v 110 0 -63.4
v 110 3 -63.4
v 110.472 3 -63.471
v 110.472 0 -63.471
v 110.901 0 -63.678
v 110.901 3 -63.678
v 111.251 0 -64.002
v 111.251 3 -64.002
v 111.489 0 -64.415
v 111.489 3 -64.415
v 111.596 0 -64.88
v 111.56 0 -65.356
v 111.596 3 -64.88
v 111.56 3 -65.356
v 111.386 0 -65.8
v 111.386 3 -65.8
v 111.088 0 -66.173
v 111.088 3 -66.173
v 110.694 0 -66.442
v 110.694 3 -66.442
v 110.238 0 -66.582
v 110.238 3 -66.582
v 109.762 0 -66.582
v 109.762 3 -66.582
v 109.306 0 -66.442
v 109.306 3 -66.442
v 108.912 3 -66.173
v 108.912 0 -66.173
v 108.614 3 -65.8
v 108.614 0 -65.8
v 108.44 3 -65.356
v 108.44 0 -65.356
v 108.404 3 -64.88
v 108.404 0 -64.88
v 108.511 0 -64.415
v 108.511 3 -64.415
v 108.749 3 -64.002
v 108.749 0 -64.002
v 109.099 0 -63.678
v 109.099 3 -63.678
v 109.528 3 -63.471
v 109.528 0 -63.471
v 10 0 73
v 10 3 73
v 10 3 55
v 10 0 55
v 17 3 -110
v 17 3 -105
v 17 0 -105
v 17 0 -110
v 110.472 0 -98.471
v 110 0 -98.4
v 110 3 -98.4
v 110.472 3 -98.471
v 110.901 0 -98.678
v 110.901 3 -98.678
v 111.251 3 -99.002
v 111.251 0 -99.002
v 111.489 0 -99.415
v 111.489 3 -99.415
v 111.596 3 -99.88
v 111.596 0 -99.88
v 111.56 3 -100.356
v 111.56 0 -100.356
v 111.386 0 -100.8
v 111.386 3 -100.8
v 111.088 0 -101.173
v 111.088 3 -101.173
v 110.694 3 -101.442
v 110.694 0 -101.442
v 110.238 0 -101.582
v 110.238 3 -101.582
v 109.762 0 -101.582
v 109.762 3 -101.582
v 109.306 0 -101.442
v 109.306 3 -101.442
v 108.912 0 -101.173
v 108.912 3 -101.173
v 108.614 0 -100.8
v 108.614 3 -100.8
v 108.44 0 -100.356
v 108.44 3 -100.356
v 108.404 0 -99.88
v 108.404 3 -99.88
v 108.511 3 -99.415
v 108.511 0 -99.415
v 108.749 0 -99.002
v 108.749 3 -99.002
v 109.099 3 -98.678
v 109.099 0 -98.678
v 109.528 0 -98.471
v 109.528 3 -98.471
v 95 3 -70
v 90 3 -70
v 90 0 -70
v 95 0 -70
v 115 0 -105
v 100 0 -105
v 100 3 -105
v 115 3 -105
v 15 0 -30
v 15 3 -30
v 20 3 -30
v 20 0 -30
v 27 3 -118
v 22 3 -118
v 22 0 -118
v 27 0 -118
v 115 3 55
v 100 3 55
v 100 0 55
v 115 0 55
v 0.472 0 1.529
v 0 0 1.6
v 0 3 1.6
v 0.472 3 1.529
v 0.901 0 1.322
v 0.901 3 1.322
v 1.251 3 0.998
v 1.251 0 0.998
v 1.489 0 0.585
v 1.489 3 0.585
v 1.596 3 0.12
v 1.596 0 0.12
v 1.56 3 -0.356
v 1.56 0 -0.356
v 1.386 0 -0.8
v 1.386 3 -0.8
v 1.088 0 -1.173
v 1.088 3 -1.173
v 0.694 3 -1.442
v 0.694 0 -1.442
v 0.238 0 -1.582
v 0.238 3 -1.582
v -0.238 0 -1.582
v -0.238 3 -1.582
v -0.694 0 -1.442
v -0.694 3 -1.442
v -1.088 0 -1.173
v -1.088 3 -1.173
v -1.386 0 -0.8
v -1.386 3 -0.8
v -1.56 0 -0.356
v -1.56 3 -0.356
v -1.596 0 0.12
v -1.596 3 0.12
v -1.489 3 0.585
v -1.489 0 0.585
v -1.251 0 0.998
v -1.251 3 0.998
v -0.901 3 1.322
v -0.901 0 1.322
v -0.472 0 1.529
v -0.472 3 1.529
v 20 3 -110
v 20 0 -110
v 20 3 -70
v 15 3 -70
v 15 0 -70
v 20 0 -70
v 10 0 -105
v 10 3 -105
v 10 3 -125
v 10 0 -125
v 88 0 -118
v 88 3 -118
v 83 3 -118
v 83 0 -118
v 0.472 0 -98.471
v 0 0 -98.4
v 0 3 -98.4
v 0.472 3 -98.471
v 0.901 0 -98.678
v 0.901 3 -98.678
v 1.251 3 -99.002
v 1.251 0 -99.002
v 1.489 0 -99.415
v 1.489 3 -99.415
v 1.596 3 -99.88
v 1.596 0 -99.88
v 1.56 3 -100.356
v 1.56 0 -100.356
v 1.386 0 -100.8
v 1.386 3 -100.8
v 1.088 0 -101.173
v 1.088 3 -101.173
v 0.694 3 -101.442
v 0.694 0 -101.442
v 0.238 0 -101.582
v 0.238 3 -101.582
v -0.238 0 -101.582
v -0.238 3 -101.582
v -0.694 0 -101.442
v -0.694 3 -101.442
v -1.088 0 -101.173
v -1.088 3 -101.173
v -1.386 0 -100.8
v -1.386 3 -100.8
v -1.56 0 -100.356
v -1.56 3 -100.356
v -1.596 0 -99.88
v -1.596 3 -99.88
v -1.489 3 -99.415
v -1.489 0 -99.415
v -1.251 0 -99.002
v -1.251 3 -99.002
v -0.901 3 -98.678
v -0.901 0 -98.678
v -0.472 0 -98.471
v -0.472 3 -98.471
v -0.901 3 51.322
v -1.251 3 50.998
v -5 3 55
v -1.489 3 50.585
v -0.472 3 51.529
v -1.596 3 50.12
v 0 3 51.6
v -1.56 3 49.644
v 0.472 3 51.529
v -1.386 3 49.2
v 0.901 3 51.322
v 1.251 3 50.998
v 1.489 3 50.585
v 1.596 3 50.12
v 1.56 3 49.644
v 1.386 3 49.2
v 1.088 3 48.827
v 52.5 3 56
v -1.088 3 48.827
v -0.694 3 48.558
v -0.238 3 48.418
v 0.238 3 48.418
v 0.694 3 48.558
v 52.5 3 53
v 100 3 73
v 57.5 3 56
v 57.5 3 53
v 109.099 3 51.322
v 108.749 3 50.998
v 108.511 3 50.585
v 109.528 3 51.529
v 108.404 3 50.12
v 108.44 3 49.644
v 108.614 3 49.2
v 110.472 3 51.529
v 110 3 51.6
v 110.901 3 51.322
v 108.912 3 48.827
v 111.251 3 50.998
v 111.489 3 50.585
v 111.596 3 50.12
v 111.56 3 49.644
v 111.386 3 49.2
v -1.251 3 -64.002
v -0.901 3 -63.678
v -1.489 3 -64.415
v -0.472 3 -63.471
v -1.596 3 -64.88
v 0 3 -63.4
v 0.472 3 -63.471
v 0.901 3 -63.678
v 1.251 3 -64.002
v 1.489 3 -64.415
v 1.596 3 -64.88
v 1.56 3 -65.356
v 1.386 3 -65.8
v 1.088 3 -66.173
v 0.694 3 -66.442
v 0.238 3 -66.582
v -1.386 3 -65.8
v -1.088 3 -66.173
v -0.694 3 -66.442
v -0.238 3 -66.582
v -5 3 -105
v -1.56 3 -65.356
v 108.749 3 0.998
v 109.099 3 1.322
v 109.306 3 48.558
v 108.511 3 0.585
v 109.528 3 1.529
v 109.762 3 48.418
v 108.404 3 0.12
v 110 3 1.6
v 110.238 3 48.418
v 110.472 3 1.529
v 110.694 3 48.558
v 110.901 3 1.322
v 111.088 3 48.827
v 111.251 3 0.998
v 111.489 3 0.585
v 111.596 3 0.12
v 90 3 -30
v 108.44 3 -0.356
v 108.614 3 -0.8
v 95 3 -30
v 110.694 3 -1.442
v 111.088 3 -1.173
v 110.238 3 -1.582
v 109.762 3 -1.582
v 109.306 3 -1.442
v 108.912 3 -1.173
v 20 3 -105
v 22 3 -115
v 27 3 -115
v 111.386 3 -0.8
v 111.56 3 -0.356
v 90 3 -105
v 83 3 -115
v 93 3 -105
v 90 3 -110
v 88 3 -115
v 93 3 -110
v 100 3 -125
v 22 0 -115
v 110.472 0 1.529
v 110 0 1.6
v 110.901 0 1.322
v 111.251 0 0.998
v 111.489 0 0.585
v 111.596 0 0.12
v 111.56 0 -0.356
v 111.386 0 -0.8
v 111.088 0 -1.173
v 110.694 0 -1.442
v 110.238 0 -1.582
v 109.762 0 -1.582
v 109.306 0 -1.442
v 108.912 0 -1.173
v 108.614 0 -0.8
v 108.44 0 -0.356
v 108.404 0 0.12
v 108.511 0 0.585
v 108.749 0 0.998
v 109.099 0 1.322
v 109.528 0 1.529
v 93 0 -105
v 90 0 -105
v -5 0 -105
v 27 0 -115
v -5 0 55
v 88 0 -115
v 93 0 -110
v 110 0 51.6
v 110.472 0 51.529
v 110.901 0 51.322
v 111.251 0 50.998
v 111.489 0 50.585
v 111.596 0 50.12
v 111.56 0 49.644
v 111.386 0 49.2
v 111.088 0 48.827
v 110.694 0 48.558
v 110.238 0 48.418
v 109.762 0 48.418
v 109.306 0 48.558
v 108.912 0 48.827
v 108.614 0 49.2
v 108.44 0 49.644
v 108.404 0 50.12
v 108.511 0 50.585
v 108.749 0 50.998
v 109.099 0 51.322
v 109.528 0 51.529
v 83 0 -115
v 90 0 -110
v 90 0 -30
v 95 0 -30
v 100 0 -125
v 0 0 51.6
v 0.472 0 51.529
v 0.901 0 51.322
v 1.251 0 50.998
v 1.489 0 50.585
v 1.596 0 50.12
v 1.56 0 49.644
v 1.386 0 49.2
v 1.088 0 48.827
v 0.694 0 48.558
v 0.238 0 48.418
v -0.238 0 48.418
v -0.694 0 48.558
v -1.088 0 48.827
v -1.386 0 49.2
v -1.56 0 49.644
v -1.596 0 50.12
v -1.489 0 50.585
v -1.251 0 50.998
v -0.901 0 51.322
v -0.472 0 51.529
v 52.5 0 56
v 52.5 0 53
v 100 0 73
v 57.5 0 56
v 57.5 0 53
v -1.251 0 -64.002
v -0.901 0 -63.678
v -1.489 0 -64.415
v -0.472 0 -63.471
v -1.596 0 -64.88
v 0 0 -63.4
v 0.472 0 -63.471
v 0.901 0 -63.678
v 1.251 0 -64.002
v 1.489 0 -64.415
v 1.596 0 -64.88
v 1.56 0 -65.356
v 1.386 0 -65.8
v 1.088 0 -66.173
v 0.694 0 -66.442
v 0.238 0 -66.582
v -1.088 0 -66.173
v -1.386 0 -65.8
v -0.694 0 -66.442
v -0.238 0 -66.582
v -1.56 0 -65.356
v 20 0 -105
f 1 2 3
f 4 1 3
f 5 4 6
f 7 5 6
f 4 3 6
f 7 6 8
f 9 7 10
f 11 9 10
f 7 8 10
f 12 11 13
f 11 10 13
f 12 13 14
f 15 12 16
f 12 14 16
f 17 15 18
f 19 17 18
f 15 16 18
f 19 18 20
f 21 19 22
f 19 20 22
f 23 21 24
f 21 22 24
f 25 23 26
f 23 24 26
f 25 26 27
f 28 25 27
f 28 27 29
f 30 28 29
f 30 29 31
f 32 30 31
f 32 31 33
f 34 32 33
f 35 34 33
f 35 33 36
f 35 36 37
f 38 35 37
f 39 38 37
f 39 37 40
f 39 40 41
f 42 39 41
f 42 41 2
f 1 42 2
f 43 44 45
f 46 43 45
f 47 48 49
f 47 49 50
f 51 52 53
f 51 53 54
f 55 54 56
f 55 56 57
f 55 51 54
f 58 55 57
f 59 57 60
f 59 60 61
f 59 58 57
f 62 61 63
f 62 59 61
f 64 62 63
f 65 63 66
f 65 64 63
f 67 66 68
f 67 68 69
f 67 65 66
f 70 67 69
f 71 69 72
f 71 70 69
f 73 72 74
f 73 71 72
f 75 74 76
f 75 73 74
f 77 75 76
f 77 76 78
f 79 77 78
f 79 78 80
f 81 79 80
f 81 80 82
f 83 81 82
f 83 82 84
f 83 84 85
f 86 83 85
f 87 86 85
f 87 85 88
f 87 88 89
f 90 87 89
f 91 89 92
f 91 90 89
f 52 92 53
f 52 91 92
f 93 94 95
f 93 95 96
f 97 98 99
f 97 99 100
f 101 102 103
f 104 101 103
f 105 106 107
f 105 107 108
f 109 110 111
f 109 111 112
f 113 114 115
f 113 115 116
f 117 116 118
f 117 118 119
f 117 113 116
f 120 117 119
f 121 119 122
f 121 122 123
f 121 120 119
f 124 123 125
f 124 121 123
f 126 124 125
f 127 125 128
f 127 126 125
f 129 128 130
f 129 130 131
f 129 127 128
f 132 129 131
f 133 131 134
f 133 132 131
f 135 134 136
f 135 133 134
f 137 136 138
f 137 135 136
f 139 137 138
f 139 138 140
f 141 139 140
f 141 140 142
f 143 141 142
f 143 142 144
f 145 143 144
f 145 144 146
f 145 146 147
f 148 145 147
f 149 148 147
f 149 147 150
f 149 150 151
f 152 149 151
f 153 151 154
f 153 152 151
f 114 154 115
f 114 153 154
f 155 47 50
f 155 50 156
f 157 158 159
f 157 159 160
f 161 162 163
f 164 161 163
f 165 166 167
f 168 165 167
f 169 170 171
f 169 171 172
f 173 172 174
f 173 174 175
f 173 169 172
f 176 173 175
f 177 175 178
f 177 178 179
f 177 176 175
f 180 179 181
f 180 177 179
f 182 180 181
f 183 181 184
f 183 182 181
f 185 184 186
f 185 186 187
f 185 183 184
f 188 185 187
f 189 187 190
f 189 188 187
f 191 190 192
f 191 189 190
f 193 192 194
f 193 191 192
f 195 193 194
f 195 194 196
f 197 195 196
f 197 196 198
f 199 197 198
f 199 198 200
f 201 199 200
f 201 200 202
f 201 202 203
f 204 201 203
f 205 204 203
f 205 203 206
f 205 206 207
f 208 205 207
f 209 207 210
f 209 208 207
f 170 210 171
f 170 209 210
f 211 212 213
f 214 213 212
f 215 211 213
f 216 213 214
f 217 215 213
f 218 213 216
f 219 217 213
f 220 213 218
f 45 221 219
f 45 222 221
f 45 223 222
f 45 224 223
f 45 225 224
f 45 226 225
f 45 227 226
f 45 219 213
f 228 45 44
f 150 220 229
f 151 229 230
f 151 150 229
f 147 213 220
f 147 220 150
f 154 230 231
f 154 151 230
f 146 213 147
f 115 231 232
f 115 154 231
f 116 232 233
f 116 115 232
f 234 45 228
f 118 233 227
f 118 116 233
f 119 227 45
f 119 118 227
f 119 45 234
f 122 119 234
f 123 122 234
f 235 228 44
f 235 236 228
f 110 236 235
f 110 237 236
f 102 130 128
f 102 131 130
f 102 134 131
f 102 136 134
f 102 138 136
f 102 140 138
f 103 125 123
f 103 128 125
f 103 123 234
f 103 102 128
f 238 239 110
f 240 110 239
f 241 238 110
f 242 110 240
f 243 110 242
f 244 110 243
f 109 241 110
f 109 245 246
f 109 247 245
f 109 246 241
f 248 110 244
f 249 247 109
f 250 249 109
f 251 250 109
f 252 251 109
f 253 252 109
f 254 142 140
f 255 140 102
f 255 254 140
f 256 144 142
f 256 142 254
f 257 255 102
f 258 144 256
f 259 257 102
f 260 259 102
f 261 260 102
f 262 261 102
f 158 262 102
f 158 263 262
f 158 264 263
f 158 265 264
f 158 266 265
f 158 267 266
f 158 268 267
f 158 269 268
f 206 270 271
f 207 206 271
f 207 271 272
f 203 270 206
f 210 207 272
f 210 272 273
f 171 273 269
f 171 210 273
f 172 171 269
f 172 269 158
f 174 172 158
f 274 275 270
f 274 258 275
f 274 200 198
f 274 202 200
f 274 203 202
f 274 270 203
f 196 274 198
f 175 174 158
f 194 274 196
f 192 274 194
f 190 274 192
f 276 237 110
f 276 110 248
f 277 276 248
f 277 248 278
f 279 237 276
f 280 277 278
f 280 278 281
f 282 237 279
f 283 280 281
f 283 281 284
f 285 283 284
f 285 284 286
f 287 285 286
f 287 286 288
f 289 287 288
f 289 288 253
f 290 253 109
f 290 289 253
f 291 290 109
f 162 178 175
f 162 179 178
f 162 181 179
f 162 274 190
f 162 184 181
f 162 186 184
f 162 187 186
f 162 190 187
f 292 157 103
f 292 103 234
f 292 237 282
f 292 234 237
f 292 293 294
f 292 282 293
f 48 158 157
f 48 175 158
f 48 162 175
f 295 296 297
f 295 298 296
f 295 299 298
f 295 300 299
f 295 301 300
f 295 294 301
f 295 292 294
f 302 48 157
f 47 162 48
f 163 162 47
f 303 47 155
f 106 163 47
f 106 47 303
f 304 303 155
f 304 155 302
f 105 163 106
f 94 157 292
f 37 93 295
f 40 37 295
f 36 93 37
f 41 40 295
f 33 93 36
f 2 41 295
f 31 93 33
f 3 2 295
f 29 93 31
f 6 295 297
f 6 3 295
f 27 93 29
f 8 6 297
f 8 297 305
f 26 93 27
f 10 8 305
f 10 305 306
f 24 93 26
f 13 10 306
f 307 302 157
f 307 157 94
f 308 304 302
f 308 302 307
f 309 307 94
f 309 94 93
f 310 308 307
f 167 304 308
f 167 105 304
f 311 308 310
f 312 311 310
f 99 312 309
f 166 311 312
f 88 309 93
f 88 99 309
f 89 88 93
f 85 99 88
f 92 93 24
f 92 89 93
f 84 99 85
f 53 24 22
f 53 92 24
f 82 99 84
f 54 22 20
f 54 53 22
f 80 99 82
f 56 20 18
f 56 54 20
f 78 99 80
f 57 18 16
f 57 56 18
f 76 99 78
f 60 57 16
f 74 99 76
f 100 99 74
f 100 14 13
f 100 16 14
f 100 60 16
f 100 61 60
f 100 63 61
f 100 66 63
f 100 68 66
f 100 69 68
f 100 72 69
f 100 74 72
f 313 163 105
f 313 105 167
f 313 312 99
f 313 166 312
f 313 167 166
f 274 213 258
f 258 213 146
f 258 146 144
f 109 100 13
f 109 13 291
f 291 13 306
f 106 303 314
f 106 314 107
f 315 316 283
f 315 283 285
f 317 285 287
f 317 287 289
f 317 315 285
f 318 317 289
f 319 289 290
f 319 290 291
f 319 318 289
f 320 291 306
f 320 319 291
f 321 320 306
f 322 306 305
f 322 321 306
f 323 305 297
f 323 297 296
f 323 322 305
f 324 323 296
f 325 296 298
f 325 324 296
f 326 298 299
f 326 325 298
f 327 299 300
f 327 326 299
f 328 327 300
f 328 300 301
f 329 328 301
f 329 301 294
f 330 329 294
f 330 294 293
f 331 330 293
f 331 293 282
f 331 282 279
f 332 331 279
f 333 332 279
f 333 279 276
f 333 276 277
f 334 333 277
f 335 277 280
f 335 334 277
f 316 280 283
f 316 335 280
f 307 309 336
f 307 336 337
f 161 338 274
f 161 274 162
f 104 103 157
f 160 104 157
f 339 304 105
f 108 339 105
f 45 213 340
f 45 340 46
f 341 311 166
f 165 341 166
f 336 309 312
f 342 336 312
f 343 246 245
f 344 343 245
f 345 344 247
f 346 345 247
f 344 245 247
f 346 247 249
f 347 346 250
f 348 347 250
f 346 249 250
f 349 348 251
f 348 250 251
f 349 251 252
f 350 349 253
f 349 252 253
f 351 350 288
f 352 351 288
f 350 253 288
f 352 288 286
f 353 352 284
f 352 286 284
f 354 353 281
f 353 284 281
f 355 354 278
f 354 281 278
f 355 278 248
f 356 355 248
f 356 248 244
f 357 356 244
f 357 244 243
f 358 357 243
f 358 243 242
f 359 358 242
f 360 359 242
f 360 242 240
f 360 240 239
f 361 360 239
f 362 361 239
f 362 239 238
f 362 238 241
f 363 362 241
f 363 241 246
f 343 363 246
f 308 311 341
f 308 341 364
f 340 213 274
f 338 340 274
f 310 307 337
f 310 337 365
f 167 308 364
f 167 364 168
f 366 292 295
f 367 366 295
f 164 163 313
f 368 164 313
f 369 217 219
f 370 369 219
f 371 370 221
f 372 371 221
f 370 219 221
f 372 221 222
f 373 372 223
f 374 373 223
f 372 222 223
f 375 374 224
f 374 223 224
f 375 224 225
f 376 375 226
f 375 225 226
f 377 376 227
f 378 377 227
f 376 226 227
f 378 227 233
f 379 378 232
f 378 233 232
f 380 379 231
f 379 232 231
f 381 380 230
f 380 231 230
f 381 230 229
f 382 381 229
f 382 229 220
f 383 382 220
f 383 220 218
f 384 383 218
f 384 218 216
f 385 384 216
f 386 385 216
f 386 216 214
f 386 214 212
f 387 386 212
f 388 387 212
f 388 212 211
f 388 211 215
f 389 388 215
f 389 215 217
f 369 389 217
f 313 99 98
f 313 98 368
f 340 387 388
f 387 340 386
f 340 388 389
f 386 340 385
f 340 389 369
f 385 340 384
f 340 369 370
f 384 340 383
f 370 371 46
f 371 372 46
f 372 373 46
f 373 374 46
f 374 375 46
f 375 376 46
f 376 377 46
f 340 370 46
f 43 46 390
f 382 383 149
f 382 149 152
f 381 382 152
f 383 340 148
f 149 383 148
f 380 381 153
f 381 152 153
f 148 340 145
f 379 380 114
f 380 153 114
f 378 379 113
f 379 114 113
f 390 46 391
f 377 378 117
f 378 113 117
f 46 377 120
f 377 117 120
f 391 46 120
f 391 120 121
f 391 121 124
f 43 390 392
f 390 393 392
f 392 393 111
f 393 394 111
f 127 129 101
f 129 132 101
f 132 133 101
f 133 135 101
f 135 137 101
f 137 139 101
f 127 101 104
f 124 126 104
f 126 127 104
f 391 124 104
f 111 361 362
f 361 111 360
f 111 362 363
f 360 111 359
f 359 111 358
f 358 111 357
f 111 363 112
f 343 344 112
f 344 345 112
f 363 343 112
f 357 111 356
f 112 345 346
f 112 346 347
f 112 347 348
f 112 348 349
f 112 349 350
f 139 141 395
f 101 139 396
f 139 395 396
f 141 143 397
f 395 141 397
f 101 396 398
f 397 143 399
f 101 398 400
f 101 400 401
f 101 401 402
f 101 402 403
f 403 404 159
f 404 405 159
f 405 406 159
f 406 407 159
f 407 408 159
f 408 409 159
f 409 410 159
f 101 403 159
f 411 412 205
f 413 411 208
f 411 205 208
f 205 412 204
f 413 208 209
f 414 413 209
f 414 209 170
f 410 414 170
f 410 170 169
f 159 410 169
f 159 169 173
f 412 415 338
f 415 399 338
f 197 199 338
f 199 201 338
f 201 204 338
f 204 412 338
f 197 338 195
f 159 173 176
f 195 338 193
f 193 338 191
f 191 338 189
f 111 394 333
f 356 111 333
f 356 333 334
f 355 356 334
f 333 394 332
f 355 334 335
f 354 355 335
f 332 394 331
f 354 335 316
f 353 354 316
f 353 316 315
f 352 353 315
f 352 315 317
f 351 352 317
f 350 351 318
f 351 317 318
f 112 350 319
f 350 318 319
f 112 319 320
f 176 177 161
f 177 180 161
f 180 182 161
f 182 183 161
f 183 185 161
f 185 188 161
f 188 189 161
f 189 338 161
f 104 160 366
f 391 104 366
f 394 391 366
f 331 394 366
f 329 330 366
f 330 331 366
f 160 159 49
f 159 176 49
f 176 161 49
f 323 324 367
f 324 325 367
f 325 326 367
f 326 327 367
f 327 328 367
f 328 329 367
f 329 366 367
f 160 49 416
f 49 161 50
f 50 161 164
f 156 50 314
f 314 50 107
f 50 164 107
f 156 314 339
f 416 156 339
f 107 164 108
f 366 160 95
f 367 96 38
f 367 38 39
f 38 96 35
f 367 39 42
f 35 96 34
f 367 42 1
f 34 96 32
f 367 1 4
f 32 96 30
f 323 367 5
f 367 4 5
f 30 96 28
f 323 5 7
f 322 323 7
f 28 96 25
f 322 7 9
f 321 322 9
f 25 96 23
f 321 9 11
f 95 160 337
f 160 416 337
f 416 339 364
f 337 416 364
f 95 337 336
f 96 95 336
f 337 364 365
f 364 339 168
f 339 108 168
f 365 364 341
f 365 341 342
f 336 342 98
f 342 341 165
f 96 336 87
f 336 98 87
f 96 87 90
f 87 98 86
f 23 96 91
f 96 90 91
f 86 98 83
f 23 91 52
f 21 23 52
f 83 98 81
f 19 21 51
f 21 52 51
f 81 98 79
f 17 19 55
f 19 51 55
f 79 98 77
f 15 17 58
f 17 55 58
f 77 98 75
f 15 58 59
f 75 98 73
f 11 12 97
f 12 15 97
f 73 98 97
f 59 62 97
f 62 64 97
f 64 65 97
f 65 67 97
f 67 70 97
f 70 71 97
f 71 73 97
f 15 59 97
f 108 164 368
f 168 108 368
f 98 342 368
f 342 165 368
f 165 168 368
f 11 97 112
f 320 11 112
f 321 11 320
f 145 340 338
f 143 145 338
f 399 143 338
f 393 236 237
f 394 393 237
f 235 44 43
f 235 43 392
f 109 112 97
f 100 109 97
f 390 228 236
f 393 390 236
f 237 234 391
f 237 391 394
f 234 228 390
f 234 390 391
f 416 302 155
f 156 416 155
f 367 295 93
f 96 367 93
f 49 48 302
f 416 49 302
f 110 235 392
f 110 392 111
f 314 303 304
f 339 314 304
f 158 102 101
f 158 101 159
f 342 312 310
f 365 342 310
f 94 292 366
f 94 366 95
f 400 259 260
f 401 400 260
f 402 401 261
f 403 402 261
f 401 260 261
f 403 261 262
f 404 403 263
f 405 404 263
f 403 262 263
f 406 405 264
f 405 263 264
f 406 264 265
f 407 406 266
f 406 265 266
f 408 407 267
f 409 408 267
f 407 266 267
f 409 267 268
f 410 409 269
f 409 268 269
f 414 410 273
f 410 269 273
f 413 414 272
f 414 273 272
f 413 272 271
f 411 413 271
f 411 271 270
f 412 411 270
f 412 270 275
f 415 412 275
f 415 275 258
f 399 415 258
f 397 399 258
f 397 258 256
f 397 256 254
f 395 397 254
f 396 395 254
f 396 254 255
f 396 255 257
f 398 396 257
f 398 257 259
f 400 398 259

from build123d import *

# Parameters (mm, degrees)
SKETCH_2_W          = 120
SKETCH_2_H          = 110
SKETCH_2_R          = 1.6
EXTRUDE_1_DEPTH     = 3
SKETCH_4_W          = 90
SKETCH_4_H          = 198
EXTRUDE_2_DEPTH     = 3
SKETCH_7_W          = 5
SKETCH_7_H          = 3
SKETCH_7_W_2        = 3
SKETCH_7_H_2        = 5
CUT_EXTRUDE_1_DEPTH = 170.879368965
SKETCH_8_W          = 5
SKETCH_8_H          = 3
CUT_EXTRUDE_2_DEPTH = 170.879368965
SKETCH_9_W          = 5
SKETCH_9_H          = 40
CUT_EXTRUDE_3_DEPTH = 170.879368965
SKETCH_10_W         = 15
SKETCH_10_H         = 50
EXTRUDE_5_DEPTH     = 3
SKETCH_11_R         = 1.6
CUT_EXTRUDE_4_DEPTH = 170.879368965


with BuildPart() as part:
    # 草图2 → 凸台-拉伸1 (new body)
    with BuildSketch(Plane(origin=(0, 0, 0), x_dir=(1, 0, 0), z_dir=(0, 1, 0))):
        with Locations((55, 50)):
            Rectangle(SKETCH_2_W, SKETCH_2_H)
        with Locations(Location((0, 100, 0), (0, 0, 270))):
            Circle(SKETCH_2_R, mode=Mode.SUBTRACT)
        with Locations(Location((110, 100, 0), (0, 0, 270))):
            Circle(SKETCH_2_R, mode=Mode.SUBTRACT)
        with Locations(Location((0, 0, 0), (0, 0, 270))):
            Circle(SKETCH_2_R, mode=Mode.SUBTRACT)
        with Locations(Location((110, 0, 0), (0, 0, 270))):
            Circle(SKETCH_2_R, mode=Mode.SUBTRACT)
    extrude(amount=EXTRUDE_1_DEPTH)

    # 草图4 → 凸台-拉伸2 (add)
    with BuildSketch(Plane(origin=(0, 3, 0), x_dir=(1, 0, 0), z_dir=(0, 1, 0))):
        with Locations((55, 26)):
            Rectangle(SKETCH_4_W, SKETCH_4_H)
    extrude(amount=-EXTRUDE_2_DEPTH)

    # 草图7 → 切除-拉伸1 (cut, through all)
    with BuildSketch(Plane(origin=(0, 3, 0), x_dir=(1, 0, 0), z_dir=(0, 1, 0))):
        with Locations((24.5, 116.5)):
            Rectangle(SKETCH_7_W, SKETCH_7_H)
        with Locations((18.5, 107.5)):
            Rectangle(SKETCH_7_W_2, SKETCH_7_H_2)
    cut_extrude_1 = extrude(amount=-CUT_EXTRUDE_1_DEPTH, mode=Mode.SUBTRACT)

    # 镜向1: 切除-拉伸1 across plane
    add(cut_extrude_1.mirror(Plane.ZY.offset(-55)), mode=Mode.SUBTRACT)

    # 草图8 → 切除-拉伸2 (cut, through all)
    with BuildSketch(Plane(origin=(0, 3, 0), x_dir=(1, 0, 0), z_dir=(0, 1, 0))):
        with Locations((55, -54.5)):
            Rectangle(SKETCH_8_W, SKETCH_8_H)
    extrude(amount=-CUT_EXTRUDE_2_DEPTH, mode=Mode.SUBTRACT)

    # 草图9 → 切除-拉伸3 (cut, through all)
    with BuildSketch(Plane(origin=(0, 3, 0), x_dir=(1, 0, 0), z_dir=(0, 1, 0))):
        with Locations((17.5, 50)):
            Rectangle(SKETCH_9_W, SKETCH_9_H)
        with Locations((92.5, 50)):
            Rectangle(SKETCH_9_W, SKETCH_9_H)
    extrude(amount=-CUT_EXTRUDE_3_DEPTH, mode=Mode.SUBTRACT)

    # 草图10 → 凸台-拉伸5 (add)
    with BuildSketch(Plane(origin=(0, 3, 0), x_dir=(1, 0, 0), z_dir=(0, 1, 0))):
        with Locations((2.5, -30)):
            Rectangle(SKETCH_10_W, SKETCH_10_H)
        with Locations((107.5, -30)):
            Rectangle(SKETCH_10_W, SKETCH_10_H)
    extrude(amount=-EXTRUDE_5_DEPTH)

    # 草图11 → 切除-拉伸4 (cut, through all)
    with BuildSketch(Plane(origin=(0, 3, 0), x_dir=(1, 0, 0), z_dir=(0, 1, 0))):
        with Locations(Location((0, -50, 0), (0, 0, 270))):
            Circle(SKETCH_11_R)
        with Locations(Location((0, 65, 0), (0, 0, 270))):
            Circle(SKETCH_11_R)
        with Locations(Location((110, -50, 0), (0, 0, 270))):
            Circle(SKETCH_11_R)
        with Locations(Location((110, 65, 0), (0, 0, 270))):
            Circle(SKETCH_11_R)
    extrude(amount=-CUT_EXTRUDE_4_DEPTH, mode=Mode.SUBTRACT)


solid = part.part
